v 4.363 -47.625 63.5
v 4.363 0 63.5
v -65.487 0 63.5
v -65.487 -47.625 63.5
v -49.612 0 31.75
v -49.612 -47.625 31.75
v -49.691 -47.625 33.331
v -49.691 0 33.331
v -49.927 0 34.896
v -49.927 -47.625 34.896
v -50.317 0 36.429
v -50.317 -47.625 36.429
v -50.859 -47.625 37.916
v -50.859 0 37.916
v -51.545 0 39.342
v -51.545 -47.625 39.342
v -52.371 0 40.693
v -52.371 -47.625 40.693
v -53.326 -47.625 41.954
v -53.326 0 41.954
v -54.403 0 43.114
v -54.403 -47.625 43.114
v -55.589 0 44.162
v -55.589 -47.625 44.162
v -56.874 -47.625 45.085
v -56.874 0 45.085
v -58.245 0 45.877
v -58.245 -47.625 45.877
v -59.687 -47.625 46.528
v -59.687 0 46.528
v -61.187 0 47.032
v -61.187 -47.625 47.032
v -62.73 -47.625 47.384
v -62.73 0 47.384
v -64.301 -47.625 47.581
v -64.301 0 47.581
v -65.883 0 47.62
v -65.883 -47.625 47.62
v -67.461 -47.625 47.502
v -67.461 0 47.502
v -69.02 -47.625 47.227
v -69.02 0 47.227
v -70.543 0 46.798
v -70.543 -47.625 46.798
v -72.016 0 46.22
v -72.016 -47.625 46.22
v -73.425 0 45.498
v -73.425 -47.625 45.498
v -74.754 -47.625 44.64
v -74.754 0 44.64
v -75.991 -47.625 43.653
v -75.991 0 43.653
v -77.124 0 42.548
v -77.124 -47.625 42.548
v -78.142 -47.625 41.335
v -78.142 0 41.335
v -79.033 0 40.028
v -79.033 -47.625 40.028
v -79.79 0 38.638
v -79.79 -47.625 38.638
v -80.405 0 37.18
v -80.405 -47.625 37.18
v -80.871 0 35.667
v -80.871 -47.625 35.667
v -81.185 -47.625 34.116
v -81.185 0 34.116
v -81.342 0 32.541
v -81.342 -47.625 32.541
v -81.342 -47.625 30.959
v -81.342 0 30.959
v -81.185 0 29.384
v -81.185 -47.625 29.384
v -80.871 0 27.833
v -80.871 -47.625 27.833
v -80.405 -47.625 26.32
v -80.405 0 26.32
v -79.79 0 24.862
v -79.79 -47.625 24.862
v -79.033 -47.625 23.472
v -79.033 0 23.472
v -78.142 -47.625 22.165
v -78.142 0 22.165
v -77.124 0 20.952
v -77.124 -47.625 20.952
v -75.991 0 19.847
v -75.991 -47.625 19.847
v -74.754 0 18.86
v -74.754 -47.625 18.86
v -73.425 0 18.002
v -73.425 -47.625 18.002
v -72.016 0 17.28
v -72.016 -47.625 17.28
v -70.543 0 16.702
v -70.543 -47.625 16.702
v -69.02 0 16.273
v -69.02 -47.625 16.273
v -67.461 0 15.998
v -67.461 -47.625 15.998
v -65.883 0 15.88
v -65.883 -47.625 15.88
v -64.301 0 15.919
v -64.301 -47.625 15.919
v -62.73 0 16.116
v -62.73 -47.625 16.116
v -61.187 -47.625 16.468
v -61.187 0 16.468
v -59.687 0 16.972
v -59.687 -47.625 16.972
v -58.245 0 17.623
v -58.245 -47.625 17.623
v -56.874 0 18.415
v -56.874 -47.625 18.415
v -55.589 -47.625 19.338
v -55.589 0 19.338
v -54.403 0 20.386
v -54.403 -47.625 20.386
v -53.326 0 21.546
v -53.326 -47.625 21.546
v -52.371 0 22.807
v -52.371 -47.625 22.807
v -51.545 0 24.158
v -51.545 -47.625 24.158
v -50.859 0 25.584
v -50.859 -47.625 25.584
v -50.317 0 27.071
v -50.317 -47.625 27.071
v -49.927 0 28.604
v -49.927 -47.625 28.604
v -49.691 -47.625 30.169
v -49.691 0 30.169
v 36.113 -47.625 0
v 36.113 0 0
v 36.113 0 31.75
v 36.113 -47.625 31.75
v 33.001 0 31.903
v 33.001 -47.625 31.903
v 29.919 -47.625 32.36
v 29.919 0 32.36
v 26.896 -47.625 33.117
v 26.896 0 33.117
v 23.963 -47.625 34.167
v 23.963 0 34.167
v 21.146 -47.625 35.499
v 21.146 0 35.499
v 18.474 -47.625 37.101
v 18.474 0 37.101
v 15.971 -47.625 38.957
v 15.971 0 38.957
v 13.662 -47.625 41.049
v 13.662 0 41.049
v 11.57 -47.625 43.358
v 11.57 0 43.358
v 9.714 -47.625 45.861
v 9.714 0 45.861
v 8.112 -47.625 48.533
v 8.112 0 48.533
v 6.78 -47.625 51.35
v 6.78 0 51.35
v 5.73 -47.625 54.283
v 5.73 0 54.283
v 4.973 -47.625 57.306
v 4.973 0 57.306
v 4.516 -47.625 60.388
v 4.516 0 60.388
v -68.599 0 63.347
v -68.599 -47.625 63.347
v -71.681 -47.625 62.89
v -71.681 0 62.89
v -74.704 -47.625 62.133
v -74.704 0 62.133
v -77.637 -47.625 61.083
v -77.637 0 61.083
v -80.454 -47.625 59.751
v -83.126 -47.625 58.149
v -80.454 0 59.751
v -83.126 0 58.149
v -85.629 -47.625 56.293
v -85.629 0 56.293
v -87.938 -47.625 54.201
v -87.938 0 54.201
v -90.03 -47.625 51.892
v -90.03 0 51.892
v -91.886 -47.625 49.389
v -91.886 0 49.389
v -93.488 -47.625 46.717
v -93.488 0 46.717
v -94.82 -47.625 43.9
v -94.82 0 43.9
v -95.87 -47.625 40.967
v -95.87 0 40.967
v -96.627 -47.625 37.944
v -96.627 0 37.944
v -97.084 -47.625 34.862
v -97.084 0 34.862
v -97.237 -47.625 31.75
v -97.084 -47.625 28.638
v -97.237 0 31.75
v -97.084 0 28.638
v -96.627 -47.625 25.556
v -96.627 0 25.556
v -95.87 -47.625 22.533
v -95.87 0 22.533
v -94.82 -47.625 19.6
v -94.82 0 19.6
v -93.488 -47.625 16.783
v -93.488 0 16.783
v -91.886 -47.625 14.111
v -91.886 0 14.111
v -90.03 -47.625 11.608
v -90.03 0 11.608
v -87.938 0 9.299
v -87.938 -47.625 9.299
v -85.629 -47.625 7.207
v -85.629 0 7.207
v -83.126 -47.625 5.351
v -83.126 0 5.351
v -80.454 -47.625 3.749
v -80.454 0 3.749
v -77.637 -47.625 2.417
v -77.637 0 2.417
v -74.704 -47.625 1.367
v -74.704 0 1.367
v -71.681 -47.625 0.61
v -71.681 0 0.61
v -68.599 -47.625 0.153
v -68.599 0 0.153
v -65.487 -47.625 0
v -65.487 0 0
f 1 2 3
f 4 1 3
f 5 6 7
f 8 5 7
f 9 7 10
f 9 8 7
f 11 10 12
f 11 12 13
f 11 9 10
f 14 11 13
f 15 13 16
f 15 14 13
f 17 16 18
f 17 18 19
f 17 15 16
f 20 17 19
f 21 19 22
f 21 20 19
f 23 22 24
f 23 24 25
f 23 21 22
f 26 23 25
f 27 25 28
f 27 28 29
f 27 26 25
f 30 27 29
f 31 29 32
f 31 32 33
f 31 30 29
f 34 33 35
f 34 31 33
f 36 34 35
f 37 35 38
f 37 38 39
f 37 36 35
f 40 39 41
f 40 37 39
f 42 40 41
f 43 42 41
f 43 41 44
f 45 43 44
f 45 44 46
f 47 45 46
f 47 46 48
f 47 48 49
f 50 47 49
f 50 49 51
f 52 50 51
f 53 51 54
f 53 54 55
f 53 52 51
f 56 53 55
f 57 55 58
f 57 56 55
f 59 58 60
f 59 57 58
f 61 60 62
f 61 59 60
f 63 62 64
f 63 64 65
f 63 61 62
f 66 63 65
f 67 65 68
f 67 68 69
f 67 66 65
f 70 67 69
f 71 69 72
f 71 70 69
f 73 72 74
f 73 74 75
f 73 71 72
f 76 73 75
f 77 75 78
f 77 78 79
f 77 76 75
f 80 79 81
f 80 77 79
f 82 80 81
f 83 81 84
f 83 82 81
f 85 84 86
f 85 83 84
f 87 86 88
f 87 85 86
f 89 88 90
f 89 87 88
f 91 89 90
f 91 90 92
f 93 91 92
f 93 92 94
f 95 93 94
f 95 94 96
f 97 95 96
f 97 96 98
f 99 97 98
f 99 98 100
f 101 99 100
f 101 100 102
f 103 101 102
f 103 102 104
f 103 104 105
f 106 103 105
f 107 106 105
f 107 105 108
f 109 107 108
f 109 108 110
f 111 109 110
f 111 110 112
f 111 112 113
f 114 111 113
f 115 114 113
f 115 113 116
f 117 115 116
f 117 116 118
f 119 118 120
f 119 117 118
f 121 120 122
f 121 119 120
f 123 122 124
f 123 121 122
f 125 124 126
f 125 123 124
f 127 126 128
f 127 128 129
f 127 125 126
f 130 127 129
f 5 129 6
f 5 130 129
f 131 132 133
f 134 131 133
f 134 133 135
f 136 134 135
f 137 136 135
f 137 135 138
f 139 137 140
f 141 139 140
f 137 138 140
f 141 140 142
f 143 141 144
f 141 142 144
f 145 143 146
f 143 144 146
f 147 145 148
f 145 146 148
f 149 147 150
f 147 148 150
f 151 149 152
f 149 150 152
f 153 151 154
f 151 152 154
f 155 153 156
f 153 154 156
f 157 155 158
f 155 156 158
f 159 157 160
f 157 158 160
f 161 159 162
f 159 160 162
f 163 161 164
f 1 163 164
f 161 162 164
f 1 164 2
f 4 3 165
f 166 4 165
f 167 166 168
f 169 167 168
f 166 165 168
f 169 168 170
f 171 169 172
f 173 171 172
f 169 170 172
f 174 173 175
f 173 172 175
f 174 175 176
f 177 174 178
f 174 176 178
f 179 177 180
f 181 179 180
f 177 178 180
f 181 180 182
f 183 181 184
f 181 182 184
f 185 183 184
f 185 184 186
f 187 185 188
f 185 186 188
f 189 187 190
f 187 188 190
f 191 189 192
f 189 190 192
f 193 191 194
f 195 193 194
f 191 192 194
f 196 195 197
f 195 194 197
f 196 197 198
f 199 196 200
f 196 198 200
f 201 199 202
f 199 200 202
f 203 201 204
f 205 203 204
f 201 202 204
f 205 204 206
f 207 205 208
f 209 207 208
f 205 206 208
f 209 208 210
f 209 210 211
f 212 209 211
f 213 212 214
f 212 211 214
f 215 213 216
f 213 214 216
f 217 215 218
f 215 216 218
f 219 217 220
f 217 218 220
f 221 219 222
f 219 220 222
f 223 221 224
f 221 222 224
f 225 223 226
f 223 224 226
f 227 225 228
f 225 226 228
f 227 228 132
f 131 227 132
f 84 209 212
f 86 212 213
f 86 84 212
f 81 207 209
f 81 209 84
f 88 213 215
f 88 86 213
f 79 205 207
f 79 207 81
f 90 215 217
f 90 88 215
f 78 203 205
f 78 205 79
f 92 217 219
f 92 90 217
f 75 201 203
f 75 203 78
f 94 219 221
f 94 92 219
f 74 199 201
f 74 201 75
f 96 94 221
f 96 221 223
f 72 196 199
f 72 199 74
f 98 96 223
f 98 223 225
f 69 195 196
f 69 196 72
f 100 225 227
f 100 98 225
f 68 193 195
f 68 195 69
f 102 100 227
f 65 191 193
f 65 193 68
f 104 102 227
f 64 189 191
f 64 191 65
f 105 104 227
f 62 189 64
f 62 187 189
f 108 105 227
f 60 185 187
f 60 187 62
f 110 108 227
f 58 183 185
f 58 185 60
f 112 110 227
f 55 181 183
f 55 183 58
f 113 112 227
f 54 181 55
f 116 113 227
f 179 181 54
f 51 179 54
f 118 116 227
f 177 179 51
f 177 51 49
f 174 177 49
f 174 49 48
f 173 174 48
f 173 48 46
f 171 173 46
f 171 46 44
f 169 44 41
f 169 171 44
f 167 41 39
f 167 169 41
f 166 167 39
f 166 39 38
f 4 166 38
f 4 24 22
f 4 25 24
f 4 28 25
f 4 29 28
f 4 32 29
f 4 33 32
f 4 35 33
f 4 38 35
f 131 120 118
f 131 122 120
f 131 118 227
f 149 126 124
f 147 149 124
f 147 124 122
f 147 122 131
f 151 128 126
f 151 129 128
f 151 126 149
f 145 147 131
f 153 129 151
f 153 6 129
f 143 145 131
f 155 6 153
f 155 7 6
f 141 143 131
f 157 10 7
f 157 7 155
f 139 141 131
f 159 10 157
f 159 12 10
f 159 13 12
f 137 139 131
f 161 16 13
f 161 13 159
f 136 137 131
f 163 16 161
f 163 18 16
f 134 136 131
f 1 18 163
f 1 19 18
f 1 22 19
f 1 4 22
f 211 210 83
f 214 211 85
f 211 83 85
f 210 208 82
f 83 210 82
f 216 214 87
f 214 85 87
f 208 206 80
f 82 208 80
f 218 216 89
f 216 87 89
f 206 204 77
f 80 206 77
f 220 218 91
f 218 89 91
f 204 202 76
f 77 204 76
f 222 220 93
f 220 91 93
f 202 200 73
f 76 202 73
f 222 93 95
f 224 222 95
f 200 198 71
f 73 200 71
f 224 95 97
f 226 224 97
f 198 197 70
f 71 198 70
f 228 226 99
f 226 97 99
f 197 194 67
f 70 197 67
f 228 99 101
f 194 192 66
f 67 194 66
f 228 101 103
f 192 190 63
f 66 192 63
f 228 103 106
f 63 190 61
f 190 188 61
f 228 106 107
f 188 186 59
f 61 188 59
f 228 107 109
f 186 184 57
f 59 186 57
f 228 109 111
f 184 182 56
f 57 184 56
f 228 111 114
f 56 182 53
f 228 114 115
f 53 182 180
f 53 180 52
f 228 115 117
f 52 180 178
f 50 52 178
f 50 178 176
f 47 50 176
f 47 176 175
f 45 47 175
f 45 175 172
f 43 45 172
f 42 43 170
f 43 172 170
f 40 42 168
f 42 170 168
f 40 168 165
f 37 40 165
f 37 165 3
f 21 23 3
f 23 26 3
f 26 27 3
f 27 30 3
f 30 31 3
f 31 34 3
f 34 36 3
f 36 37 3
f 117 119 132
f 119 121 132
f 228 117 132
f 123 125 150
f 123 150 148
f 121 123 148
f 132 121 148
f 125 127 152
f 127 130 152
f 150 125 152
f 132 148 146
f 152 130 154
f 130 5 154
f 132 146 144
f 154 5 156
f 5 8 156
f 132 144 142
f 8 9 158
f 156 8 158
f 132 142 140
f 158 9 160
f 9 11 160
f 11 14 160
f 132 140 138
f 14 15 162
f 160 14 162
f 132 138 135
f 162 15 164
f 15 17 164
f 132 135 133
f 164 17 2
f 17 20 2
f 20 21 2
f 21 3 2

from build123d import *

# Parameters (mm, degrees)
F0_R     = 15.875
F1_DEPTH = 47.625


with BuildPart() as f1:
    # F0 (on Front) → F1 (new body)
    with BuildSketch(Plane.XZ):
        with BuildLine():
            ThreePointArc((-65.487075, 63.5), (-97.237075, 31.75), (-65.487075, 0))
            Line((-65.487075, 0), (36.112925, 0))
            Line((36.112925, 0), (36.112925, 31.75))
            ThreePointArc((36.112925, 31.75), (13.662285, 41.04936), (4.362925, 63.5))
            Line((4.362925, 63.5), (-65.487075, 63.5))
        make_face()
        with Locations((-65.487075, 31.75)):
            Circle(F0_R, mode=Mode.SUBTRACT)
    extrude(amount=F1_DEPTH)


solid = f1.part
